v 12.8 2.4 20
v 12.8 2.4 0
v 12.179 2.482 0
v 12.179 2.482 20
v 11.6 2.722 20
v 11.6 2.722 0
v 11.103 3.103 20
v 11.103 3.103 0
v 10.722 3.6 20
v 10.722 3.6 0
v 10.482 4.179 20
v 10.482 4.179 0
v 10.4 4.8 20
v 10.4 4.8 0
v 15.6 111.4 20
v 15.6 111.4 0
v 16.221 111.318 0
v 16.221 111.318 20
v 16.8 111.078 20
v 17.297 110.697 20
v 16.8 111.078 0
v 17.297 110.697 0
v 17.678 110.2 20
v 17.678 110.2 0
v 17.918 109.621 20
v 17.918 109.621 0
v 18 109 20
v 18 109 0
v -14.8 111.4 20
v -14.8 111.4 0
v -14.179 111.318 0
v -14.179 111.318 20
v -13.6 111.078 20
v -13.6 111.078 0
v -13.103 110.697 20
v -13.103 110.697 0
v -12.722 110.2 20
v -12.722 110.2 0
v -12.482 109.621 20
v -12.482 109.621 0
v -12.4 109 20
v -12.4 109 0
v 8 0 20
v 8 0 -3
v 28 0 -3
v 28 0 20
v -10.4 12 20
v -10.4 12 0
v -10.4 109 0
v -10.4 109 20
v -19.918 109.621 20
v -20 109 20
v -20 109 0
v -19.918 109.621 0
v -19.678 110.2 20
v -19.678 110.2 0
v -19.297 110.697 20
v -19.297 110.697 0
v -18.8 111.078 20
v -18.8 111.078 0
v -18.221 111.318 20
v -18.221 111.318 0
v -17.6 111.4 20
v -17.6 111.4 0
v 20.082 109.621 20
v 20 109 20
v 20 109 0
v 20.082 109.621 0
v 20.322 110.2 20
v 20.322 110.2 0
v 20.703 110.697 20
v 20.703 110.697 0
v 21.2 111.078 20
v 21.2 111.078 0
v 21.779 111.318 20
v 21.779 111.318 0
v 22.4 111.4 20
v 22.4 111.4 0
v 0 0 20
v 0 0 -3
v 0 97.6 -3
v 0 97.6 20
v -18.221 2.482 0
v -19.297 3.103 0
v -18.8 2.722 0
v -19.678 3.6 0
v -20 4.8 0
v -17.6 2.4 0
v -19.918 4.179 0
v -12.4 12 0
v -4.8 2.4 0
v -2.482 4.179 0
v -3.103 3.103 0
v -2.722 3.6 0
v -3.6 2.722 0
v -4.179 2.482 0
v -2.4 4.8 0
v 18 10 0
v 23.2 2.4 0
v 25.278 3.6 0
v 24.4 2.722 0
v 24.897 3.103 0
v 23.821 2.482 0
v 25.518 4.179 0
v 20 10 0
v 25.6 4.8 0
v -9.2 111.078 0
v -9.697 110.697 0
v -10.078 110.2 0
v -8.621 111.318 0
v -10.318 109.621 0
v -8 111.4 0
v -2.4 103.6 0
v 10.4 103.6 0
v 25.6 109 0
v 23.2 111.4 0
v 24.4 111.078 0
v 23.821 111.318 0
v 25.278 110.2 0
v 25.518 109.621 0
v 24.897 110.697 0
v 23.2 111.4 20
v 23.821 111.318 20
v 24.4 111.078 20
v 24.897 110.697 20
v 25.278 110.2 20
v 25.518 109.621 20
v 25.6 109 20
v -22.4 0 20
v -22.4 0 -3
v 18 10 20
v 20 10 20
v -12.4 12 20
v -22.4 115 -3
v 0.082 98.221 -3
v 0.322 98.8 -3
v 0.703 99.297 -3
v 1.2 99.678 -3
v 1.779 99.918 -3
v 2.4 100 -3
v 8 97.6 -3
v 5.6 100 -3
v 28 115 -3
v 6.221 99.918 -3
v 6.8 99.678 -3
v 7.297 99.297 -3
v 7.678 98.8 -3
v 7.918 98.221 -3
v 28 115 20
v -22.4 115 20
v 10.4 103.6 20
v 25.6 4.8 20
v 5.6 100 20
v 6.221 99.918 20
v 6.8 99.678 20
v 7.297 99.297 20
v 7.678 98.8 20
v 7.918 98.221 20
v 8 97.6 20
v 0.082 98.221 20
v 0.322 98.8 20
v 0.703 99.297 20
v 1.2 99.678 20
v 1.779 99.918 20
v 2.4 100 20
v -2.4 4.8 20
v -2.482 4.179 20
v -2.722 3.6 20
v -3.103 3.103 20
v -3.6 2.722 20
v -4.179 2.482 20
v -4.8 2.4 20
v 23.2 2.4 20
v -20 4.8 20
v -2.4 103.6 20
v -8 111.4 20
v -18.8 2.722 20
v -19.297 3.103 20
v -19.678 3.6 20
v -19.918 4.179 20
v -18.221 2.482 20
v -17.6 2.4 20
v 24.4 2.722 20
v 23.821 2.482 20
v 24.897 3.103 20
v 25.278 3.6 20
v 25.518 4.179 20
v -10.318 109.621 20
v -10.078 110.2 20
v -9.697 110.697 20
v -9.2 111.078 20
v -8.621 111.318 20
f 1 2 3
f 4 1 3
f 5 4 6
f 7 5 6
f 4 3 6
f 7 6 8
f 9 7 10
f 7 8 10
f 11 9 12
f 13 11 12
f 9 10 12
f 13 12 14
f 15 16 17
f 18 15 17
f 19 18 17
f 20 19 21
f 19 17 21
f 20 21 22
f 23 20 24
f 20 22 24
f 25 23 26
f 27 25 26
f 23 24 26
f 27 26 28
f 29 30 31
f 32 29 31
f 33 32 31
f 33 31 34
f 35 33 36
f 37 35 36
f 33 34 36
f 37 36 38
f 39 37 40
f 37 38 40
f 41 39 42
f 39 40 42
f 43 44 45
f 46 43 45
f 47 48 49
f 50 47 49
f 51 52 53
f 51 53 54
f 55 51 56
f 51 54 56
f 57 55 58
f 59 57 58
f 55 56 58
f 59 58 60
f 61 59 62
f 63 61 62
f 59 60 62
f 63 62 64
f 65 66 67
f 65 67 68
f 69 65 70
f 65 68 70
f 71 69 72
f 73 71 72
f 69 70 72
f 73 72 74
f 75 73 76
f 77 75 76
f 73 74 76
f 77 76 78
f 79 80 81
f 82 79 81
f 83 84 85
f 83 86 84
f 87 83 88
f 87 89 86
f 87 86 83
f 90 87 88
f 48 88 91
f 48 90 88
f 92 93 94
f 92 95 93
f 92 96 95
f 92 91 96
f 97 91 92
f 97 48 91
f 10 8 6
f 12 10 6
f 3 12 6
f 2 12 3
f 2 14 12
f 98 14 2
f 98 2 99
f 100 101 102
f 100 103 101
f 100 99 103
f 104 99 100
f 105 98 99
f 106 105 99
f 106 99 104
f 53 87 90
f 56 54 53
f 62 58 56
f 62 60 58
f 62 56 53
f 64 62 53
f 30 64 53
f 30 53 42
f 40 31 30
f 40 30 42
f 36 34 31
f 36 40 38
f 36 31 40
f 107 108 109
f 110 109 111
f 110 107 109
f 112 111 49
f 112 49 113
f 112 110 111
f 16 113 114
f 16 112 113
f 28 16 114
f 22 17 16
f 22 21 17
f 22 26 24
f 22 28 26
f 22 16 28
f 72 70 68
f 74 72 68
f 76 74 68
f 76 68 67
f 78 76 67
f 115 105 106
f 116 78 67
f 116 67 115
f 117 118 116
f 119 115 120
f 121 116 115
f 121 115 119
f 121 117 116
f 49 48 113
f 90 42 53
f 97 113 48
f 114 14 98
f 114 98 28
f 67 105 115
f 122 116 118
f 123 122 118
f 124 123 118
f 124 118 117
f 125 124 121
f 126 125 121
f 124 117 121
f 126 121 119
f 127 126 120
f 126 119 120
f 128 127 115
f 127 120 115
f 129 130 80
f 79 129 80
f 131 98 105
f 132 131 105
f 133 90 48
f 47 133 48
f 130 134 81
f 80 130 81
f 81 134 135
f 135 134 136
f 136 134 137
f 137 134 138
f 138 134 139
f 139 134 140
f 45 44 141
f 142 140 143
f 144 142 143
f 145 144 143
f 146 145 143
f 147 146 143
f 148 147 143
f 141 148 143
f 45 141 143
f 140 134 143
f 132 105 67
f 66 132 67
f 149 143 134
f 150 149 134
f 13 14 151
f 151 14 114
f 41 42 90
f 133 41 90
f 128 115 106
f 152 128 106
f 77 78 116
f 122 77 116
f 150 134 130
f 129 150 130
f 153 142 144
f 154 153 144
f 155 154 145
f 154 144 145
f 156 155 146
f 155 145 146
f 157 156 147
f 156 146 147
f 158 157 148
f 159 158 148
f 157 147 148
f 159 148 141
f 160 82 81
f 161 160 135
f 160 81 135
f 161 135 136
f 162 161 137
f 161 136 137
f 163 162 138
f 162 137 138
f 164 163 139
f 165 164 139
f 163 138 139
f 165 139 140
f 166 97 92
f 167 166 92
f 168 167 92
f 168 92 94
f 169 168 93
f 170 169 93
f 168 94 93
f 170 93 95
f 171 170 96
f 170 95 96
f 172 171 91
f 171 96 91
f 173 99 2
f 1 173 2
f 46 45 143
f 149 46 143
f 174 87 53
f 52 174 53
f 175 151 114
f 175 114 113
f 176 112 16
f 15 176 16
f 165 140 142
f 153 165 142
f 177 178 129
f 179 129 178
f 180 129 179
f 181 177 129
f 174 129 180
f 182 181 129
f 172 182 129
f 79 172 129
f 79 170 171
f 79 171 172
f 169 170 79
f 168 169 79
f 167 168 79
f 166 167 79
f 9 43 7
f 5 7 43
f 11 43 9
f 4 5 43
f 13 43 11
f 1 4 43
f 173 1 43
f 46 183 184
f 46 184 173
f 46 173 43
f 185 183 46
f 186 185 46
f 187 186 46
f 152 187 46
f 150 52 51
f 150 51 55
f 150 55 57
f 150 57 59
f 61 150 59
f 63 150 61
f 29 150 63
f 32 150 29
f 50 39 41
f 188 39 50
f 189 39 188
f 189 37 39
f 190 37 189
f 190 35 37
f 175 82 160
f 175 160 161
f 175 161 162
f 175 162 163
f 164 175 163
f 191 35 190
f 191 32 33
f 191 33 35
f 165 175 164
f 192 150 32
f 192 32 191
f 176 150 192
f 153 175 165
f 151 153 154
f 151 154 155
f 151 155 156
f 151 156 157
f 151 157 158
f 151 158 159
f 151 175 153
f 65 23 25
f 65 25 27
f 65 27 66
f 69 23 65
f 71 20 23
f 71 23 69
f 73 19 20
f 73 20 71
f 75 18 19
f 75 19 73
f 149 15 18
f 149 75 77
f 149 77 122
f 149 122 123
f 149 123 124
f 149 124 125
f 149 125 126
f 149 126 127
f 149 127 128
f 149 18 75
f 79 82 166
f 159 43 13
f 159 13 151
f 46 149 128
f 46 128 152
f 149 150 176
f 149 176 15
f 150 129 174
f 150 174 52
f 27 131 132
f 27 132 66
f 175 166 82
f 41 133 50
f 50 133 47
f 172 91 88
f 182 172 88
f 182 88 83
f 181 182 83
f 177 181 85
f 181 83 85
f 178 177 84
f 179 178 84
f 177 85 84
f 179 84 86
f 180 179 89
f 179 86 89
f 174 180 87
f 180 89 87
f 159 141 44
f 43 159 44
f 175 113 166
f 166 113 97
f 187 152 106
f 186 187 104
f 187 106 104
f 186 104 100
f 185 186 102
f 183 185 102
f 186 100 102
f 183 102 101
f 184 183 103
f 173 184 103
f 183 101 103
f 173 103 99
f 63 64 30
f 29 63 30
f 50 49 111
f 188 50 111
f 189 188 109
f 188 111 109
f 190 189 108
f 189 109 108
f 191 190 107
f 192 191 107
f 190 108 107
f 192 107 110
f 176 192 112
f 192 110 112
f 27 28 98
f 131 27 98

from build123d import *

# Parameters (mm, degrees)
BOSS_EXTRUDE1_DEPTH = 20
BOSS_EXTRUDE2_START = -3
BOSS_EXTRUDE2_DEPTH = 3


with BuildPart() as part:
    # Sketch1 → Boss-Extrude1 (new body)
    with BuildSketch(Plane.XY):
        with BuildLine():
            Line((0, 0), (0, 97.6))
            ThreePointArc((0, 97.6), (0.702943725, 99.297056275), (2.4, 100))
            Line((2.4, 100), (5.6, 100))
            ThreePointArc((5.6, 100), (7.297056275, 99.297056275), (8, 97.6))
            Line((8, 97.6), (8, 0))
            Line((8, 0), (28, 0))
            Line((28, 0), (28, 115))
            Line((28, 115), (18, 115))
            Line((18, 115), (-10, 115))
            Line((-10, 115), (-22.4, 115))
            Line((-22.4, 115), (-22.4, 0))
            Line((-22.4, 0), (0, 0))
        make_face()
        with BuildLine():
            Line((18, 109), (18, 10))
            Line((18, 10), (20, 10))
            Line((20, 10), (20, 109))
            ThreePointArc((20, 109), (20.702943725, 110.697056275), (22.4, 111.4))
            Line((22.4, 111.4), (23.2, 111.4))
            ThreePointArc((23.2, 111.4), (24.897056275, 110.697056275), (25.6, 109))
            Line((25.6, 109), (25.6, 4.8))
            ThreePointArc((25.6, 4.8), (24.897056275, 3.102943725), (23.2, 2.4))
            Line((23.2, 2.4), (12.8, 2.4))
            ThreePointArc((12.8, 2.4), (11.102943725, 3.102943725), (10.4, 4.8))
            Line((10.4, 4.8), (10.4, 103.6))
            Line((10.4, 103.6), (-2.4, 103.6))
            Line((-2.4, 103.6), (-2.4, 4.8))
            ThreePointArc((-2.4, 4.8), (-3.102943725, 3.102943725), (-4.8, 2.4))
            Line((-4.8, 2.4), (-17.6, 2.4))
            ThreePointArc((-17.6, 2.4), (-19.297056275, 3.102943725), (-20, 4.8))
            Line((-20, 4.8), (-20, 109))
            ThreePointArc((-20, 109), (-19.297056275, 110.697056275), (-17.6, 111.4))
            Line((-17.6, 111.4), (-14.8, 111.4))
            ThreePointArc((-14.8, 111.4), (-13.102943725, 110.697056275), (-12.4, 109))
            Line((-12.4, 109), (-12.4, 12))
            Line((-12.4, 12), (-10.4, 12))
            Line((-10.4, 12), (-10.4, 109))
            ThreePointArc((-10.4, 109), (-9.697056275, 110.697056275), (-8, 111.4))
            Line((-8, 111.4), (15.6, 111.4))
            ThreePointArc((15.6, 111.4), (17.297056275, 110.697056275), (18, 109))
        make_face(mode=Mode.SUBTRACT)
    extrude(amount=BOSS_EXTRUDE1_DEPTH)

    # Sketch2 → Boss-Extrude2 (add)
    with BuildSketch(Plane.XY.offset(BOSS_EXTRUDE2_START)):
        with BuildLine():
            Line((28, 115), (-22.4, 115))
            Line((-22.4, 115), (-22.4, 0))
            Line((-22.4, 0), (0, 0))
            Line((0, 0), (0, 97.6))
            ThreePointArc((0, 97.6), (0.702943725, 99.297056275), (2.4, 100))
            Line((2.4, 100), (5.6, 100))
            ThreePointArc((5.6, 100), (7.297056275, 99.297056275), (8, 97.6))
            Line((8, 97.6), (8, 0))
            Line((8, 0), (28, 0))
            Line((28, 0), (28, 115))
        make_face()
    extrude(amount=BOSS_EXTRUDE2_DEPTH)


solid = part.part
